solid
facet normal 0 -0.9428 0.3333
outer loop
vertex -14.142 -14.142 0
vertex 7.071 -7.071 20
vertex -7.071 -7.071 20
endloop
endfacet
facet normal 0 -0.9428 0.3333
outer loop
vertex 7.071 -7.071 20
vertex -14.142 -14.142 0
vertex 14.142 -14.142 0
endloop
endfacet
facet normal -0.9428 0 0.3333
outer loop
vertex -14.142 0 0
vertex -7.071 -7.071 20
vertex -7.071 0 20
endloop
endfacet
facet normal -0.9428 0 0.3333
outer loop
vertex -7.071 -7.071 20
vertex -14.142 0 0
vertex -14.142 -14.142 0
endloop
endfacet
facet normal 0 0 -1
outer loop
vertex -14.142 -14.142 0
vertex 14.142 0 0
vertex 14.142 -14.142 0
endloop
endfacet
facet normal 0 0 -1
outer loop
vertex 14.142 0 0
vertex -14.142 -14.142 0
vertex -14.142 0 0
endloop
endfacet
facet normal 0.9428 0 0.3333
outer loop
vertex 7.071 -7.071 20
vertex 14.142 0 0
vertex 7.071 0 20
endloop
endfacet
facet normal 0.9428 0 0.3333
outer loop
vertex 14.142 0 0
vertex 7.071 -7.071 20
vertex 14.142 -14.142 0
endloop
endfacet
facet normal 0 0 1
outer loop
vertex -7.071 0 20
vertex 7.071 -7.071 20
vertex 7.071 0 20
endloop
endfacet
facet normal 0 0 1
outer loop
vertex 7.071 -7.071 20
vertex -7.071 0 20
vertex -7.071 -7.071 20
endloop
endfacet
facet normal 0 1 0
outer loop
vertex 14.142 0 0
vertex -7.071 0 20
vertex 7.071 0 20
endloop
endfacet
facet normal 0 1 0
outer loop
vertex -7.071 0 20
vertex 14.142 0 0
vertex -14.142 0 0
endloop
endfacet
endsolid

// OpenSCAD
width=12;

backdepth=3;
backhang=40;

backwidth=1.8;

/*
cube([backhang, backdepth, width]);

translate([0, backdepth, 0]) {
  color("blue") {
    cube([10, backwidth, width]);
  }
}

fronthang=30;

translate([0, backdepth+backwidth, 0]) {
  color("red") {
    cube([fronthang, backdepth, width]);
  }
}
*/

hangerhang = 15;
hanger_length = 60;

/*
translate([fronthang-hangerhang, backdepth+backdepth+backwidth, 0]) {
  color("orange") {
    cube([hangerhang, hanger_length, width]);
  }
}

hook_height = 20;

translate([fronthang-hook_height, backdepth+backdepth+backwidth+hanger_length, 0]) {
  color("green") {
    cube([hook_height, backdepth, width]);
  }
}
*/

difference() {
rotate([0, 0, 45]) {
cylinder(20,20,10,$fn=4);
}
#translate([-20, 0, -2]) {
cube([40, 20, 25]);
}
}
